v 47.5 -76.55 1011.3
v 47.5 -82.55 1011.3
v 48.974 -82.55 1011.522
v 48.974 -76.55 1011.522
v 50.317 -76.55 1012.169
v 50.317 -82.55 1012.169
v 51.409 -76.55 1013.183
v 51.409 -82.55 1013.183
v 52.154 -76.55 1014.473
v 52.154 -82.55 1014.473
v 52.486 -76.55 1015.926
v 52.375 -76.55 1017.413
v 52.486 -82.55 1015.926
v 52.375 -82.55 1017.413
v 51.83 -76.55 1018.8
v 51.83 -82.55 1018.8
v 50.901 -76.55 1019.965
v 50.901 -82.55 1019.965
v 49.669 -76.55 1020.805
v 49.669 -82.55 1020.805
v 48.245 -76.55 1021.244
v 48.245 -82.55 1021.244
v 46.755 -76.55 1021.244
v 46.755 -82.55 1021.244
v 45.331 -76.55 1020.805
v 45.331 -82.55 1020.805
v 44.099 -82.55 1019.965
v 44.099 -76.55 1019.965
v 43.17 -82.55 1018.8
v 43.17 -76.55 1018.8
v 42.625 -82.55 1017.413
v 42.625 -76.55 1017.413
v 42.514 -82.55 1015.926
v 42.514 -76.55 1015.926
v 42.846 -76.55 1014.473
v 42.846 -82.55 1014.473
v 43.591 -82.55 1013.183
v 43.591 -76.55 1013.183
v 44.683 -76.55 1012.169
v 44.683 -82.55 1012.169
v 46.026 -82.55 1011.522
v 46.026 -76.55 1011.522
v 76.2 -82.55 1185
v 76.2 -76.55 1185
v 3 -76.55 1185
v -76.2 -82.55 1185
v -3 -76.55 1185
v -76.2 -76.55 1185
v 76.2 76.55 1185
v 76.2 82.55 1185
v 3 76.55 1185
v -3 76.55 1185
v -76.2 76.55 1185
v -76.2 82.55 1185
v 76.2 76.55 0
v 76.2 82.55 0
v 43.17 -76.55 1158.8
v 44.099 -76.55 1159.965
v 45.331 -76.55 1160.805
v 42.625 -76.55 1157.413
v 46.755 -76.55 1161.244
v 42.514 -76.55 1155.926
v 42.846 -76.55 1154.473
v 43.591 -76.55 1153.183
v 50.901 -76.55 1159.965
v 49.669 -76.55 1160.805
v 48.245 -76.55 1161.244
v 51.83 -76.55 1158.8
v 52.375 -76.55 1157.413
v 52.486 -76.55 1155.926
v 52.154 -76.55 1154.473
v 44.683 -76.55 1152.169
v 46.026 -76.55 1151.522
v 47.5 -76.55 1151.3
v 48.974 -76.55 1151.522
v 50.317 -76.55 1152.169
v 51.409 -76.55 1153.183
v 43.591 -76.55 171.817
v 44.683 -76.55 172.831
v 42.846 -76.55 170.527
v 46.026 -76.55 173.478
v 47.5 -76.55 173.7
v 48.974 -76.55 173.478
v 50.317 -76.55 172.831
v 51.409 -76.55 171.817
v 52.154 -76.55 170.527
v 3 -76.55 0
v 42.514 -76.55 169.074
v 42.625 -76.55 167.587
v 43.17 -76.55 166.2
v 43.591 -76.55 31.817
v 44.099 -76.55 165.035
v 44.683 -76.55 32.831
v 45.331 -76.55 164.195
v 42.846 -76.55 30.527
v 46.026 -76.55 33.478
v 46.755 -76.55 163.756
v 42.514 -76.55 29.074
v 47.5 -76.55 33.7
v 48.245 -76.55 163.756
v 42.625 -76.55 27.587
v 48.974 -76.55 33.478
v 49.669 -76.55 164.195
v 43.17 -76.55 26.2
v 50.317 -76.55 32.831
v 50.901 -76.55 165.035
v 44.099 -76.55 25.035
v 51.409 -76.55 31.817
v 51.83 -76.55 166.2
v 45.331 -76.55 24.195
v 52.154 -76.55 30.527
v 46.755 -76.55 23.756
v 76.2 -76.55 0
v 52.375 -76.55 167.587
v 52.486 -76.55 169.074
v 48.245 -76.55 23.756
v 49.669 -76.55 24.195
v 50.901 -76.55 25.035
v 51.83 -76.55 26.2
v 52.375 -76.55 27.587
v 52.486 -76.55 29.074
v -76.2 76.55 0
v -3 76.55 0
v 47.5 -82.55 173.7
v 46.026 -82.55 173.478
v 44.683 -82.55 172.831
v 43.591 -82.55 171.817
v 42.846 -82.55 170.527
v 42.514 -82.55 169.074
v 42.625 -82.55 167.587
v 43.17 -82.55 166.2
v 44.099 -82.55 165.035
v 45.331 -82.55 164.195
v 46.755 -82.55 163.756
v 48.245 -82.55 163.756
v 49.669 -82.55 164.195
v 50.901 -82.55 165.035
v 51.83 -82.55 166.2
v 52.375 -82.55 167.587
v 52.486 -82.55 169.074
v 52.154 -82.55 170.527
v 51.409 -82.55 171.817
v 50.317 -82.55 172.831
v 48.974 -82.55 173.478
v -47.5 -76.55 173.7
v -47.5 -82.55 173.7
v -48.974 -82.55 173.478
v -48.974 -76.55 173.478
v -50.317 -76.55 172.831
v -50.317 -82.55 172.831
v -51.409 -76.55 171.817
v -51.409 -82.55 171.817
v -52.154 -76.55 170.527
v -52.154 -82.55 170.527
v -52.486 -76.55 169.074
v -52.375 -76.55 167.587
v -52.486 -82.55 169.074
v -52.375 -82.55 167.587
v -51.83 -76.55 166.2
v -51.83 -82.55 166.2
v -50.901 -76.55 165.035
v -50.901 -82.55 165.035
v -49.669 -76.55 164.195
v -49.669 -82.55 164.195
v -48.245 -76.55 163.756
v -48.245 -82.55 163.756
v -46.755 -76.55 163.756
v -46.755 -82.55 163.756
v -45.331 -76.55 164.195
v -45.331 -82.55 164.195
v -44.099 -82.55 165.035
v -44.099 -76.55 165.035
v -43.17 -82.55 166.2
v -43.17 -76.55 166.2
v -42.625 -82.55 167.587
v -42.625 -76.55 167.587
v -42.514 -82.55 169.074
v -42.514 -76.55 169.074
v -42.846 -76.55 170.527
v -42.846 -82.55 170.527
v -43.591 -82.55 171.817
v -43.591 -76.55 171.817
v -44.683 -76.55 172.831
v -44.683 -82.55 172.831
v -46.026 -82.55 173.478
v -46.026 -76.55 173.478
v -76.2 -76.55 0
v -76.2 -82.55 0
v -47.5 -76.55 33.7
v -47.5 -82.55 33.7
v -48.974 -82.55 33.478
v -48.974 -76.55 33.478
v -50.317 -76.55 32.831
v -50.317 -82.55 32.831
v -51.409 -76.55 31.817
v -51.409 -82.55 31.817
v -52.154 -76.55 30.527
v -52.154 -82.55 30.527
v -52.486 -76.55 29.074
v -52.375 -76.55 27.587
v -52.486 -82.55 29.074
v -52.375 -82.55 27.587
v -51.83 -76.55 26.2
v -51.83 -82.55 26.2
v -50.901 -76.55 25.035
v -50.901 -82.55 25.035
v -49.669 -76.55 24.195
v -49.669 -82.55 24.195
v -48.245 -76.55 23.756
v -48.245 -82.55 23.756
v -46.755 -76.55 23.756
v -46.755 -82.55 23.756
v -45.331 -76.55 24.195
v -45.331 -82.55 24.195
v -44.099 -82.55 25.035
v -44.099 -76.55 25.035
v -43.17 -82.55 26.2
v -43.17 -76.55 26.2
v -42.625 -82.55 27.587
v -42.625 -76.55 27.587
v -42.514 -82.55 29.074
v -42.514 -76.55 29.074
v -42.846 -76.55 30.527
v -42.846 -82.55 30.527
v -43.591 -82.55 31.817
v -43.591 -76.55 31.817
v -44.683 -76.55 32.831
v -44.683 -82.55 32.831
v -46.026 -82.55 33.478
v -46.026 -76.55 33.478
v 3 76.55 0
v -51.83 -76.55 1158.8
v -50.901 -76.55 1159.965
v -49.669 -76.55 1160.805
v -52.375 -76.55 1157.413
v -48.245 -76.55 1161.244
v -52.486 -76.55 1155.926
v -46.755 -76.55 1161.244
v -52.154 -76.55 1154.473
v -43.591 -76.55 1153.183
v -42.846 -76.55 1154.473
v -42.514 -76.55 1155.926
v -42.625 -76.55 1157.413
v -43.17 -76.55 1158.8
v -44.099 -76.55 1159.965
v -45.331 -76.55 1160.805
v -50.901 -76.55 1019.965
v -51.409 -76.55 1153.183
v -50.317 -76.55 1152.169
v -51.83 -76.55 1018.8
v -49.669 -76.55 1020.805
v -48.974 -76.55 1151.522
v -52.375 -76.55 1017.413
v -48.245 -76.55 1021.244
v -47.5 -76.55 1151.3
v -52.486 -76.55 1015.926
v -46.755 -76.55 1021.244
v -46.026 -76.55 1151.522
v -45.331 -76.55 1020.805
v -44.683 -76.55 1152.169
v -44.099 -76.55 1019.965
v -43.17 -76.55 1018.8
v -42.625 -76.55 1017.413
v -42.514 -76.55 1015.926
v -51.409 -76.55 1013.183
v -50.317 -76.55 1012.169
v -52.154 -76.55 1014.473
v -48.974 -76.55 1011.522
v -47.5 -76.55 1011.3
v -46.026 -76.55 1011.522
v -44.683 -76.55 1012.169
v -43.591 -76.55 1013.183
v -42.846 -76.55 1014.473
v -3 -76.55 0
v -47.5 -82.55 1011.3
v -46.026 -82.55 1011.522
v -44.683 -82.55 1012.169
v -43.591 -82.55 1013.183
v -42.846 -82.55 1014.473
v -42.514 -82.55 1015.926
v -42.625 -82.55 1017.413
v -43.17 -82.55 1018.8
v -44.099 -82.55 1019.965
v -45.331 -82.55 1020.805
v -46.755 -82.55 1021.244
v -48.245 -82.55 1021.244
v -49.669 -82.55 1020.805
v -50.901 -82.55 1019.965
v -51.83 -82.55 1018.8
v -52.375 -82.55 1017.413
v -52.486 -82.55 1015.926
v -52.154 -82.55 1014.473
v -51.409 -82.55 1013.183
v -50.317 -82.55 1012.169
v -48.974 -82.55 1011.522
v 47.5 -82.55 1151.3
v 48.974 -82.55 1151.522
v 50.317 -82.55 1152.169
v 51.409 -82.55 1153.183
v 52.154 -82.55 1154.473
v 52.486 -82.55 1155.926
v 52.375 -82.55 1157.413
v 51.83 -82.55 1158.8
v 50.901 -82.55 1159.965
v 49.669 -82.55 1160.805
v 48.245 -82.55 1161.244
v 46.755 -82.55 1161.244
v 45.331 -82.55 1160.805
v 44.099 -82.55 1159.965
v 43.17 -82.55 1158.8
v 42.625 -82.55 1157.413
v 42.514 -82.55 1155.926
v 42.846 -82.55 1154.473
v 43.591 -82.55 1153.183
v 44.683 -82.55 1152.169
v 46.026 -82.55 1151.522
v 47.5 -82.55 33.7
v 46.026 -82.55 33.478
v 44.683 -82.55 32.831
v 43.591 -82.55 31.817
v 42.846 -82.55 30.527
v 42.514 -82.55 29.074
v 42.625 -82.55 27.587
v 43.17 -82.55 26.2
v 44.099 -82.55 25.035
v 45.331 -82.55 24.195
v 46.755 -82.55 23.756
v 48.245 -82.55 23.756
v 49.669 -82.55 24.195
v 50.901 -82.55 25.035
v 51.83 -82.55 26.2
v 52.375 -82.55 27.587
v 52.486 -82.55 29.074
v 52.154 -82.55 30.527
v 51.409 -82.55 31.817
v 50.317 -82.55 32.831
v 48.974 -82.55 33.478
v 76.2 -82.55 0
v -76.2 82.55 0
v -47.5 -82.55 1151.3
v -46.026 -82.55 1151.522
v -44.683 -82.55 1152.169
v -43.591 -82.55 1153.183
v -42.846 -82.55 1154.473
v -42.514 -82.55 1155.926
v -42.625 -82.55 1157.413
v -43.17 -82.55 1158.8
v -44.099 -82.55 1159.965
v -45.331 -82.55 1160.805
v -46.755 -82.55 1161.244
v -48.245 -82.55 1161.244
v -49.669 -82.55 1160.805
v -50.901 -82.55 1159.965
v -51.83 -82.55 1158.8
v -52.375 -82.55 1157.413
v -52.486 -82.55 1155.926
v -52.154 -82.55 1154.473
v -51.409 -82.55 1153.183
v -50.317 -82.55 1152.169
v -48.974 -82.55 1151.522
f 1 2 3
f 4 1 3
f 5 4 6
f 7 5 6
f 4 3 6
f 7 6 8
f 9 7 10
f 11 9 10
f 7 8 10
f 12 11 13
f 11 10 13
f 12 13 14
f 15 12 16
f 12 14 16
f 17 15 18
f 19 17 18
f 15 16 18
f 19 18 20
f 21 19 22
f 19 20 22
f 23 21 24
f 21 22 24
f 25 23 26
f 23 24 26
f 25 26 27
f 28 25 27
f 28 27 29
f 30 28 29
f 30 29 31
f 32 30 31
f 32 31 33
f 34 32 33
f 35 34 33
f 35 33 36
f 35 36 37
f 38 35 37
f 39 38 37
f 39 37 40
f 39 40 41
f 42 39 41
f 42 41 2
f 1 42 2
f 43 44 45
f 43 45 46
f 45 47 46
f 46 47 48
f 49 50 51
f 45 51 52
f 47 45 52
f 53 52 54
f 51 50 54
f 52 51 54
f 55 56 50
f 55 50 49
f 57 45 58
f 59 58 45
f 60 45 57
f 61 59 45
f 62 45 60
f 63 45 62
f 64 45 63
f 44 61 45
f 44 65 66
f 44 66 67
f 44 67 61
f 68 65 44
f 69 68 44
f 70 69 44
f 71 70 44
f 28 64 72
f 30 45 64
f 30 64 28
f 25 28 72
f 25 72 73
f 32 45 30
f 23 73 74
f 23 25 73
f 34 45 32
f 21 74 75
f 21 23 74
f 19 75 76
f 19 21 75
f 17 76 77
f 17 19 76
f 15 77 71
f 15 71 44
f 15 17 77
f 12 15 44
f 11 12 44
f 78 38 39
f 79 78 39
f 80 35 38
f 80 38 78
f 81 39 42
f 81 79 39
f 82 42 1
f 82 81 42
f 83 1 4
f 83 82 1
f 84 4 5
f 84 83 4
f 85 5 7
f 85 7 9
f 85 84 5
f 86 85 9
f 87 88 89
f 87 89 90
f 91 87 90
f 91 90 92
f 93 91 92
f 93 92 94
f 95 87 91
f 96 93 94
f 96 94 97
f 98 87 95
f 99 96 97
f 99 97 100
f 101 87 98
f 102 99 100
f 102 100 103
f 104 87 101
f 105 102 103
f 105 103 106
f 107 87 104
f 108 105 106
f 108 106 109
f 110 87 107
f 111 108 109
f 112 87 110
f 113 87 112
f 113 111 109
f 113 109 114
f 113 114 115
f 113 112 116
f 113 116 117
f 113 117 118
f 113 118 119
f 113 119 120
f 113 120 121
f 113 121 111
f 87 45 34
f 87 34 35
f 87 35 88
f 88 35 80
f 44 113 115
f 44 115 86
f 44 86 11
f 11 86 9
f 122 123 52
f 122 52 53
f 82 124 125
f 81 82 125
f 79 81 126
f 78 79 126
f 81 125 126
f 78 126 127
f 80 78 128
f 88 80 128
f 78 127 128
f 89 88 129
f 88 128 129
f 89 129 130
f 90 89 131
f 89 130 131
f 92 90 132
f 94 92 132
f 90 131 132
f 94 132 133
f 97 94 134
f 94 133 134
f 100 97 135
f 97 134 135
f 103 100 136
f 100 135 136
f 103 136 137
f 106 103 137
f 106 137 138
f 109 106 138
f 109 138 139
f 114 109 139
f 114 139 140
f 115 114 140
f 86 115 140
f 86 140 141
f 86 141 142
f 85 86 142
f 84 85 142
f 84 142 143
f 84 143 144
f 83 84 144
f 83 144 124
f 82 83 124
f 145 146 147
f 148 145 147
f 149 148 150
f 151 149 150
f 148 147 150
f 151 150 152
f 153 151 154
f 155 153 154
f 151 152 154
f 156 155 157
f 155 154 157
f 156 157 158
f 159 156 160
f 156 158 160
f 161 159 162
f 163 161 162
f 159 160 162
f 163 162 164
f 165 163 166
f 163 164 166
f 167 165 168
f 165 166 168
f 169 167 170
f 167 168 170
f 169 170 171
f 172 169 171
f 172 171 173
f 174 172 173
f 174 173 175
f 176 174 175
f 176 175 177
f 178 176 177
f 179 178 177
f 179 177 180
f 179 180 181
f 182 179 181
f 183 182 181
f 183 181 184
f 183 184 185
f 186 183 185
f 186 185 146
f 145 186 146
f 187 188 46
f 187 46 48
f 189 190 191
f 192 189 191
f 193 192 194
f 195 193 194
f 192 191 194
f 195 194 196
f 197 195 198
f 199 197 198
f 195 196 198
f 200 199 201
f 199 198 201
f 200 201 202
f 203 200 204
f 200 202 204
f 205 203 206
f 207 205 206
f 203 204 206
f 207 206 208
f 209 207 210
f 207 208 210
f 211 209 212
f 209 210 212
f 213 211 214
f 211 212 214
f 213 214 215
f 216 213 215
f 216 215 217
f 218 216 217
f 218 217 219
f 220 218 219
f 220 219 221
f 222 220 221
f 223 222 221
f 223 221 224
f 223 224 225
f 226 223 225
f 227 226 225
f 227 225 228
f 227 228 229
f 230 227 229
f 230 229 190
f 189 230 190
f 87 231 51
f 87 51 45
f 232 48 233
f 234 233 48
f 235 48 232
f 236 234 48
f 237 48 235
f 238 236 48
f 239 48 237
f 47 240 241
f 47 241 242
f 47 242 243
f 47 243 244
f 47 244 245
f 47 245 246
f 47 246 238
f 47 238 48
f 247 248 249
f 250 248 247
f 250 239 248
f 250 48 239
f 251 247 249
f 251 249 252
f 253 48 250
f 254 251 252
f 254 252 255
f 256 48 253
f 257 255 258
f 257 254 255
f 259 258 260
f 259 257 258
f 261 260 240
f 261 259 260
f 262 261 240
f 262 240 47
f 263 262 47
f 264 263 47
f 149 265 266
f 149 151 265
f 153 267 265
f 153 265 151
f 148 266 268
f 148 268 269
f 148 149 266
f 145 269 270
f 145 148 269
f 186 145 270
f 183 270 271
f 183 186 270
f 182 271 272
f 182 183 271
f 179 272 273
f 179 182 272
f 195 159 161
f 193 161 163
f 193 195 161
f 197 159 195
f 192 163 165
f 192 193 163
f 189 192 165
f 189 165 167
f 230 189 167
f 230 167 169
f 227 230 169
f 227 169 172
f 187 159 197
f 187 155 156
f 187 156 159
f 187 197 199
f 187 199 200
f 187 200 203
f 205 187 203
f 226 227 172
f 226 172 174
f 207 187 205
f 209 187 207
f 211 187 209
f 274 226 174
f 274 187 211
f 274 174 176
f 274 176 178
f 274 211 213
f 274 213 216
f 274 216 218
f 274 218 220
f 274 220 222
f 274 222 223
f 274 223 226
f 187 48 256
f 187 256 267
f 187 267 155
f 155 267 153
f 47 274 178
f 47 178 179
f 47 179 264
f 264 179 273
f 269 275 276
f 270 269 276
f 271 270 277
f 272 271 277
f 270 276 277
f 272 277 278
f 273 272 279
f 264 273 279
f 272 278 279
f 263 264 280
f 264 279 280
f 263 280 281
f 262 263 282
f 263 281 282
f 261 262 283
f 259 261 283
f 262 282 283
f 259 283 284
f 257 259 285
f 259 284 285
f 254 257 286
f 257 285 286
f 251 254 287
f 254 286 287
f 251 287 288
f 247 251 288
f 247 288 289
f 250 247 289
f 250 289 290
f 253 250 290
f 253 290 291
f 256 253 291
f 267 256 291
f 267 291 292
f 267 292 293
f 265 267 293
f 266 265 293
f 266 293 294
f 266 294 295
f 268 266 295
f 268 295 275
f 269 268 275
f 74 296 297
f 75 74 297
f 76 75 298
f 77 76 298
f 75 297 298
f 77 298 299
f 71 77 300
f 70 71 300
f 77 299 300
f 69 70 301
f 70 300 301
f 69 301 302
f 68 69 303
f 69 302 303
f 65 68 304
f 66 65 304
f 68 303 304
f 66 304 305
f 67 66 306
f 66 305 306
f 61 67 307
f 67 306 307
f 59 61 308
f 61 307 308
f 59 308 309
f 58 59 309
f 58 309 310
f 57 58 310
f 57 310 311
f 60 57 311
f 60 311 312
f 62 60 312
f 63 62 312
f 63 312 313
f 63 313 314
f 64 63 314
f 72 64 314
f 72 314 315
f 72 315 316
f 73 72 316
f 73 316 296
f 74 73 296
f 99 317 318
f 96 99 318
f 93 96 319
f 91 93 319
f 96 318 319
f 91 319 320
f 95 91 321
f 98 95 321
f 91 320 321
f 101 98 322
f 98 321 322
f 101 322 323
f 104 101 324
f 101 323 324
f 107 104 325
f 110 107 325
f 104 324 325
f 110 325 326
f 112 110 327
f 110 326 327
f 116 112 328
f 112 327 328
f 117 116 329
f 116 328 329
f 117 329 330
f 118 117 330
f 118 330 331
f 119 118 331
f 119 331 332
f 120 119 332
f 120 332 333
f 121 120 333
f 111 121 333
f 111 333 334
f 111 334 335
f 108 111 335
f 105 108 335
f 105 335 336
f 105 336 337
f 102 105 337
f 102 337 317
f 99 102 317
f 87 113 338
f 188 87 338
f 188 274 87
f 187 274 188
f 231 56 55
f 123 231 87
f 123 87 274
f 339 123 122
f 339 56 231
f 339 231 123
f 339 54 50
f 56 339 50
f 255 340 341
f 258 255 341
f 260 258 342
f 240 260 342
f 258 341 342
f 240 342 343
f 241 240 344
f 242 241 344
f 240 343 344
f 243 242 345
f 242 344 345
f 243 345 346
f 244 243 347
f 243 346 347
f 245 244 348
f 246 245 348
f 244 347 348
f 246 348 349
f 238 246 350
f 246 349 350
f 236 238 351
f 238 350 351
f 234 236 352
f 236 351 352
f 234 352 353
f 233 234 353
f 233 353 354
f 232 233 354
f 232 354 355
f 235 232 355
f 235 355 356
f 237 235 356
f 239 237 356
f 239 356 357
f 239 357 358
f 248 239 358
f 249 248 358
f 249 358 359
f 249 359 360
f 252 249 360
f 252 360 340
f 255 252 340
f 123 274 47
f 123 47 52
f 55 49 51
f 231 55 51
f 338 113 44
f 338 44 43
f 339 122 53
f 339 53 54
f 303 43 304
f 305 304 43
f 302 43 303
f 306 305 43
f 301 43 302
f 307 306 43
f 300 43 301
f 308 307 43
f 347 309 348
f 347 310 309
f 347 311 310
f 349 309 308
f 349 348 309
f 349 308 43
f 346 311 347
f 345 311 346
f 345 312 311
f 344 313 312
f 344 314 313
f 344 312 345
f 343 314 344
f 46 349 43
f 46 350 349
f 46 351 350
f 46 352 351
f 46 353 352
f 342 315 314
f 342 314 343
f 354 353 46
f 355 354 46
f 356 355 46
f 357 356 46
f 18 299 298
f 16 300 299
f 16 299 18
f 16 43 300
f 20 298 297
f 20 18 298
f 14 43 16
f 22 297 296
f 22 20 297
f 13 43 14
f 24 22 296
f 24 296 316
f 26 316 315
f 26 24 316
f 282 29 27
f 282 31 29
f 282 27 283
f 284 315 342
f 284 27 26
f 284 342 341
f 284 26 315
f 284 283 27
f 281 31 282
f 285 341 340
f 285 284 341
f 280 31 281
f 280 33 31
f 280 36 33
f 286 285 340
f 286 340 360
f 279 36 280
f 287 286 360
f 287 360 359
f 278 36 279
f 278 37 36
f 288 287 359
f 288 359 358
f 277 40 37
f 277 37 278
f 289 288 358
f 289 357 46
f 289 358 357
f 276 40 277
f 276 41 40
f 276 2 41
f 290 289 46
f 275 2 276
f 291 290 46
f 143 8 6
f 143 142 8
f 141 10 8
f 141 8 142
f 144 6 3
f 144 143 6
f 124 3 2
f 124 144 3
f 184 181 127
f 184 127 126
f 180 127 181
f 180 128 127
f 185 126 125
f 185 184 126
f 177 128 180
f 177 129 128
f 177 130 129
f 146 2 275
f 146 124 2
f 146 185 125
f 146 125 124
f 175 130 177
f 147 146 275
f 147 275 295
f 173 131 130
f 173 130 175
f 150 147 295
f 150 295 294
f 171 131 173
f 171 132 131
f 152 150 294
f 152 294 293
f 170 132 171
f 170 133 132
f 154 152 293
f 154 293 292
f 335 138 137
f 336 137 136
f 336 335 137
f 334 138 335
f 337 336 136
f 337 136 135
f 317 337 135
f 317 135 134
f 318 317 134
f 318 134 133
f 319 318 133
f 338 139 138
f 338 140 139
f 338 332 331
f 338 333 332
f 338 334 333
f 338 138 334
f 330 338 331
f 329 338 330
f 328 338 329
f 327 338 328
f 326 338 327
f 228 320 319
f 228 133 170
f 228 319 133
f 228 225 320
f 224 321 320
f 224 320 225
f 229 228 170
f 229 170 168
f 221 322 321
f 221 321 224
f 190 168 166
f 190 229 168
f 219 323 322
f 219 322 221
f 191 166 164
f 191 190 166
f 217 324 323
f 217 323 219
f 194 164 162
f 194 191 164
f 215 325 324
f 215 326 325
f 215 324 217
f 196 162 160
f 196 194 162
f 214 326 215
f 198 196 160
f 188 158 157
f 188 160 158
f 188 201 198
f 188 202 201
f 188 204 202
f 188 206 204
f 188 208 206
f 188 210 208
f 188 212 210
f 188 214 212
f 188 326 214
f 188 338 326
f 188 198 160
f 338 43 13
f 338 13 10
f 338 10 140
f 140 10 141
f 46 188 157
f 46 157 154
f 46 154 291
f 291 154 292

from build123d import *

# Parameters (mm, degrees)
BOSS_EXTRUDE1_DEPTH = 1185
SKETCH3_R           = 5
CUT_EXTRUDE1_DEPTH  = 20


with BuildPart() as part:
    # Sketch1 → Boss-Extrude1 (new body)
    with BuildSketch(Plane.XY):
        Polygon((76.2, 82.55), (-76.2, 82.55), (-76.2, 76.55), (-3, 76.55), (-3, -76.55), (-76.2, -76.55), (-76.2, -82.55), (76.2, -82.55), (76.2, -76.55), (3, -76.55), (3, 76.55), (76.2, 76.55), align=None)
    extrude(amount=BOSS_EXTRUDE1_DEPTH)

    # Sketch3 → Cut-Extrude1 (cut)
    with BuildSketch(Plane.XZ.offset(82.55)):
        with Locations((-47.5, 1156.3)):
            Circle(SKETCH3_R)
        with Locations((47.5, 1156.3)):
            Circle(SKETCH3_R)
        with Locations((-47.5, 1016.3)):
            Circle(SKETCH3_R)
        with Locations((47.5, 1016.3)):
            Circle(SKETCH3_R)
        with Locations((47.5, 168.7)):
            Circle(SKETCH3_R)
        with Locations((-47.5, 168.7)):
            Circle(SKETCH3_R)
        with Locations((47.5, 28.7)):
            Circle(SKETCH3_R)
        with Locations((-47.5, 28.7)):
            Circle(SKETCH3_R)
    extrude(amount=-CUT_EXTRUDE1_DEPTH, mode=Mode.SUBTRACT)


solid = part.part
